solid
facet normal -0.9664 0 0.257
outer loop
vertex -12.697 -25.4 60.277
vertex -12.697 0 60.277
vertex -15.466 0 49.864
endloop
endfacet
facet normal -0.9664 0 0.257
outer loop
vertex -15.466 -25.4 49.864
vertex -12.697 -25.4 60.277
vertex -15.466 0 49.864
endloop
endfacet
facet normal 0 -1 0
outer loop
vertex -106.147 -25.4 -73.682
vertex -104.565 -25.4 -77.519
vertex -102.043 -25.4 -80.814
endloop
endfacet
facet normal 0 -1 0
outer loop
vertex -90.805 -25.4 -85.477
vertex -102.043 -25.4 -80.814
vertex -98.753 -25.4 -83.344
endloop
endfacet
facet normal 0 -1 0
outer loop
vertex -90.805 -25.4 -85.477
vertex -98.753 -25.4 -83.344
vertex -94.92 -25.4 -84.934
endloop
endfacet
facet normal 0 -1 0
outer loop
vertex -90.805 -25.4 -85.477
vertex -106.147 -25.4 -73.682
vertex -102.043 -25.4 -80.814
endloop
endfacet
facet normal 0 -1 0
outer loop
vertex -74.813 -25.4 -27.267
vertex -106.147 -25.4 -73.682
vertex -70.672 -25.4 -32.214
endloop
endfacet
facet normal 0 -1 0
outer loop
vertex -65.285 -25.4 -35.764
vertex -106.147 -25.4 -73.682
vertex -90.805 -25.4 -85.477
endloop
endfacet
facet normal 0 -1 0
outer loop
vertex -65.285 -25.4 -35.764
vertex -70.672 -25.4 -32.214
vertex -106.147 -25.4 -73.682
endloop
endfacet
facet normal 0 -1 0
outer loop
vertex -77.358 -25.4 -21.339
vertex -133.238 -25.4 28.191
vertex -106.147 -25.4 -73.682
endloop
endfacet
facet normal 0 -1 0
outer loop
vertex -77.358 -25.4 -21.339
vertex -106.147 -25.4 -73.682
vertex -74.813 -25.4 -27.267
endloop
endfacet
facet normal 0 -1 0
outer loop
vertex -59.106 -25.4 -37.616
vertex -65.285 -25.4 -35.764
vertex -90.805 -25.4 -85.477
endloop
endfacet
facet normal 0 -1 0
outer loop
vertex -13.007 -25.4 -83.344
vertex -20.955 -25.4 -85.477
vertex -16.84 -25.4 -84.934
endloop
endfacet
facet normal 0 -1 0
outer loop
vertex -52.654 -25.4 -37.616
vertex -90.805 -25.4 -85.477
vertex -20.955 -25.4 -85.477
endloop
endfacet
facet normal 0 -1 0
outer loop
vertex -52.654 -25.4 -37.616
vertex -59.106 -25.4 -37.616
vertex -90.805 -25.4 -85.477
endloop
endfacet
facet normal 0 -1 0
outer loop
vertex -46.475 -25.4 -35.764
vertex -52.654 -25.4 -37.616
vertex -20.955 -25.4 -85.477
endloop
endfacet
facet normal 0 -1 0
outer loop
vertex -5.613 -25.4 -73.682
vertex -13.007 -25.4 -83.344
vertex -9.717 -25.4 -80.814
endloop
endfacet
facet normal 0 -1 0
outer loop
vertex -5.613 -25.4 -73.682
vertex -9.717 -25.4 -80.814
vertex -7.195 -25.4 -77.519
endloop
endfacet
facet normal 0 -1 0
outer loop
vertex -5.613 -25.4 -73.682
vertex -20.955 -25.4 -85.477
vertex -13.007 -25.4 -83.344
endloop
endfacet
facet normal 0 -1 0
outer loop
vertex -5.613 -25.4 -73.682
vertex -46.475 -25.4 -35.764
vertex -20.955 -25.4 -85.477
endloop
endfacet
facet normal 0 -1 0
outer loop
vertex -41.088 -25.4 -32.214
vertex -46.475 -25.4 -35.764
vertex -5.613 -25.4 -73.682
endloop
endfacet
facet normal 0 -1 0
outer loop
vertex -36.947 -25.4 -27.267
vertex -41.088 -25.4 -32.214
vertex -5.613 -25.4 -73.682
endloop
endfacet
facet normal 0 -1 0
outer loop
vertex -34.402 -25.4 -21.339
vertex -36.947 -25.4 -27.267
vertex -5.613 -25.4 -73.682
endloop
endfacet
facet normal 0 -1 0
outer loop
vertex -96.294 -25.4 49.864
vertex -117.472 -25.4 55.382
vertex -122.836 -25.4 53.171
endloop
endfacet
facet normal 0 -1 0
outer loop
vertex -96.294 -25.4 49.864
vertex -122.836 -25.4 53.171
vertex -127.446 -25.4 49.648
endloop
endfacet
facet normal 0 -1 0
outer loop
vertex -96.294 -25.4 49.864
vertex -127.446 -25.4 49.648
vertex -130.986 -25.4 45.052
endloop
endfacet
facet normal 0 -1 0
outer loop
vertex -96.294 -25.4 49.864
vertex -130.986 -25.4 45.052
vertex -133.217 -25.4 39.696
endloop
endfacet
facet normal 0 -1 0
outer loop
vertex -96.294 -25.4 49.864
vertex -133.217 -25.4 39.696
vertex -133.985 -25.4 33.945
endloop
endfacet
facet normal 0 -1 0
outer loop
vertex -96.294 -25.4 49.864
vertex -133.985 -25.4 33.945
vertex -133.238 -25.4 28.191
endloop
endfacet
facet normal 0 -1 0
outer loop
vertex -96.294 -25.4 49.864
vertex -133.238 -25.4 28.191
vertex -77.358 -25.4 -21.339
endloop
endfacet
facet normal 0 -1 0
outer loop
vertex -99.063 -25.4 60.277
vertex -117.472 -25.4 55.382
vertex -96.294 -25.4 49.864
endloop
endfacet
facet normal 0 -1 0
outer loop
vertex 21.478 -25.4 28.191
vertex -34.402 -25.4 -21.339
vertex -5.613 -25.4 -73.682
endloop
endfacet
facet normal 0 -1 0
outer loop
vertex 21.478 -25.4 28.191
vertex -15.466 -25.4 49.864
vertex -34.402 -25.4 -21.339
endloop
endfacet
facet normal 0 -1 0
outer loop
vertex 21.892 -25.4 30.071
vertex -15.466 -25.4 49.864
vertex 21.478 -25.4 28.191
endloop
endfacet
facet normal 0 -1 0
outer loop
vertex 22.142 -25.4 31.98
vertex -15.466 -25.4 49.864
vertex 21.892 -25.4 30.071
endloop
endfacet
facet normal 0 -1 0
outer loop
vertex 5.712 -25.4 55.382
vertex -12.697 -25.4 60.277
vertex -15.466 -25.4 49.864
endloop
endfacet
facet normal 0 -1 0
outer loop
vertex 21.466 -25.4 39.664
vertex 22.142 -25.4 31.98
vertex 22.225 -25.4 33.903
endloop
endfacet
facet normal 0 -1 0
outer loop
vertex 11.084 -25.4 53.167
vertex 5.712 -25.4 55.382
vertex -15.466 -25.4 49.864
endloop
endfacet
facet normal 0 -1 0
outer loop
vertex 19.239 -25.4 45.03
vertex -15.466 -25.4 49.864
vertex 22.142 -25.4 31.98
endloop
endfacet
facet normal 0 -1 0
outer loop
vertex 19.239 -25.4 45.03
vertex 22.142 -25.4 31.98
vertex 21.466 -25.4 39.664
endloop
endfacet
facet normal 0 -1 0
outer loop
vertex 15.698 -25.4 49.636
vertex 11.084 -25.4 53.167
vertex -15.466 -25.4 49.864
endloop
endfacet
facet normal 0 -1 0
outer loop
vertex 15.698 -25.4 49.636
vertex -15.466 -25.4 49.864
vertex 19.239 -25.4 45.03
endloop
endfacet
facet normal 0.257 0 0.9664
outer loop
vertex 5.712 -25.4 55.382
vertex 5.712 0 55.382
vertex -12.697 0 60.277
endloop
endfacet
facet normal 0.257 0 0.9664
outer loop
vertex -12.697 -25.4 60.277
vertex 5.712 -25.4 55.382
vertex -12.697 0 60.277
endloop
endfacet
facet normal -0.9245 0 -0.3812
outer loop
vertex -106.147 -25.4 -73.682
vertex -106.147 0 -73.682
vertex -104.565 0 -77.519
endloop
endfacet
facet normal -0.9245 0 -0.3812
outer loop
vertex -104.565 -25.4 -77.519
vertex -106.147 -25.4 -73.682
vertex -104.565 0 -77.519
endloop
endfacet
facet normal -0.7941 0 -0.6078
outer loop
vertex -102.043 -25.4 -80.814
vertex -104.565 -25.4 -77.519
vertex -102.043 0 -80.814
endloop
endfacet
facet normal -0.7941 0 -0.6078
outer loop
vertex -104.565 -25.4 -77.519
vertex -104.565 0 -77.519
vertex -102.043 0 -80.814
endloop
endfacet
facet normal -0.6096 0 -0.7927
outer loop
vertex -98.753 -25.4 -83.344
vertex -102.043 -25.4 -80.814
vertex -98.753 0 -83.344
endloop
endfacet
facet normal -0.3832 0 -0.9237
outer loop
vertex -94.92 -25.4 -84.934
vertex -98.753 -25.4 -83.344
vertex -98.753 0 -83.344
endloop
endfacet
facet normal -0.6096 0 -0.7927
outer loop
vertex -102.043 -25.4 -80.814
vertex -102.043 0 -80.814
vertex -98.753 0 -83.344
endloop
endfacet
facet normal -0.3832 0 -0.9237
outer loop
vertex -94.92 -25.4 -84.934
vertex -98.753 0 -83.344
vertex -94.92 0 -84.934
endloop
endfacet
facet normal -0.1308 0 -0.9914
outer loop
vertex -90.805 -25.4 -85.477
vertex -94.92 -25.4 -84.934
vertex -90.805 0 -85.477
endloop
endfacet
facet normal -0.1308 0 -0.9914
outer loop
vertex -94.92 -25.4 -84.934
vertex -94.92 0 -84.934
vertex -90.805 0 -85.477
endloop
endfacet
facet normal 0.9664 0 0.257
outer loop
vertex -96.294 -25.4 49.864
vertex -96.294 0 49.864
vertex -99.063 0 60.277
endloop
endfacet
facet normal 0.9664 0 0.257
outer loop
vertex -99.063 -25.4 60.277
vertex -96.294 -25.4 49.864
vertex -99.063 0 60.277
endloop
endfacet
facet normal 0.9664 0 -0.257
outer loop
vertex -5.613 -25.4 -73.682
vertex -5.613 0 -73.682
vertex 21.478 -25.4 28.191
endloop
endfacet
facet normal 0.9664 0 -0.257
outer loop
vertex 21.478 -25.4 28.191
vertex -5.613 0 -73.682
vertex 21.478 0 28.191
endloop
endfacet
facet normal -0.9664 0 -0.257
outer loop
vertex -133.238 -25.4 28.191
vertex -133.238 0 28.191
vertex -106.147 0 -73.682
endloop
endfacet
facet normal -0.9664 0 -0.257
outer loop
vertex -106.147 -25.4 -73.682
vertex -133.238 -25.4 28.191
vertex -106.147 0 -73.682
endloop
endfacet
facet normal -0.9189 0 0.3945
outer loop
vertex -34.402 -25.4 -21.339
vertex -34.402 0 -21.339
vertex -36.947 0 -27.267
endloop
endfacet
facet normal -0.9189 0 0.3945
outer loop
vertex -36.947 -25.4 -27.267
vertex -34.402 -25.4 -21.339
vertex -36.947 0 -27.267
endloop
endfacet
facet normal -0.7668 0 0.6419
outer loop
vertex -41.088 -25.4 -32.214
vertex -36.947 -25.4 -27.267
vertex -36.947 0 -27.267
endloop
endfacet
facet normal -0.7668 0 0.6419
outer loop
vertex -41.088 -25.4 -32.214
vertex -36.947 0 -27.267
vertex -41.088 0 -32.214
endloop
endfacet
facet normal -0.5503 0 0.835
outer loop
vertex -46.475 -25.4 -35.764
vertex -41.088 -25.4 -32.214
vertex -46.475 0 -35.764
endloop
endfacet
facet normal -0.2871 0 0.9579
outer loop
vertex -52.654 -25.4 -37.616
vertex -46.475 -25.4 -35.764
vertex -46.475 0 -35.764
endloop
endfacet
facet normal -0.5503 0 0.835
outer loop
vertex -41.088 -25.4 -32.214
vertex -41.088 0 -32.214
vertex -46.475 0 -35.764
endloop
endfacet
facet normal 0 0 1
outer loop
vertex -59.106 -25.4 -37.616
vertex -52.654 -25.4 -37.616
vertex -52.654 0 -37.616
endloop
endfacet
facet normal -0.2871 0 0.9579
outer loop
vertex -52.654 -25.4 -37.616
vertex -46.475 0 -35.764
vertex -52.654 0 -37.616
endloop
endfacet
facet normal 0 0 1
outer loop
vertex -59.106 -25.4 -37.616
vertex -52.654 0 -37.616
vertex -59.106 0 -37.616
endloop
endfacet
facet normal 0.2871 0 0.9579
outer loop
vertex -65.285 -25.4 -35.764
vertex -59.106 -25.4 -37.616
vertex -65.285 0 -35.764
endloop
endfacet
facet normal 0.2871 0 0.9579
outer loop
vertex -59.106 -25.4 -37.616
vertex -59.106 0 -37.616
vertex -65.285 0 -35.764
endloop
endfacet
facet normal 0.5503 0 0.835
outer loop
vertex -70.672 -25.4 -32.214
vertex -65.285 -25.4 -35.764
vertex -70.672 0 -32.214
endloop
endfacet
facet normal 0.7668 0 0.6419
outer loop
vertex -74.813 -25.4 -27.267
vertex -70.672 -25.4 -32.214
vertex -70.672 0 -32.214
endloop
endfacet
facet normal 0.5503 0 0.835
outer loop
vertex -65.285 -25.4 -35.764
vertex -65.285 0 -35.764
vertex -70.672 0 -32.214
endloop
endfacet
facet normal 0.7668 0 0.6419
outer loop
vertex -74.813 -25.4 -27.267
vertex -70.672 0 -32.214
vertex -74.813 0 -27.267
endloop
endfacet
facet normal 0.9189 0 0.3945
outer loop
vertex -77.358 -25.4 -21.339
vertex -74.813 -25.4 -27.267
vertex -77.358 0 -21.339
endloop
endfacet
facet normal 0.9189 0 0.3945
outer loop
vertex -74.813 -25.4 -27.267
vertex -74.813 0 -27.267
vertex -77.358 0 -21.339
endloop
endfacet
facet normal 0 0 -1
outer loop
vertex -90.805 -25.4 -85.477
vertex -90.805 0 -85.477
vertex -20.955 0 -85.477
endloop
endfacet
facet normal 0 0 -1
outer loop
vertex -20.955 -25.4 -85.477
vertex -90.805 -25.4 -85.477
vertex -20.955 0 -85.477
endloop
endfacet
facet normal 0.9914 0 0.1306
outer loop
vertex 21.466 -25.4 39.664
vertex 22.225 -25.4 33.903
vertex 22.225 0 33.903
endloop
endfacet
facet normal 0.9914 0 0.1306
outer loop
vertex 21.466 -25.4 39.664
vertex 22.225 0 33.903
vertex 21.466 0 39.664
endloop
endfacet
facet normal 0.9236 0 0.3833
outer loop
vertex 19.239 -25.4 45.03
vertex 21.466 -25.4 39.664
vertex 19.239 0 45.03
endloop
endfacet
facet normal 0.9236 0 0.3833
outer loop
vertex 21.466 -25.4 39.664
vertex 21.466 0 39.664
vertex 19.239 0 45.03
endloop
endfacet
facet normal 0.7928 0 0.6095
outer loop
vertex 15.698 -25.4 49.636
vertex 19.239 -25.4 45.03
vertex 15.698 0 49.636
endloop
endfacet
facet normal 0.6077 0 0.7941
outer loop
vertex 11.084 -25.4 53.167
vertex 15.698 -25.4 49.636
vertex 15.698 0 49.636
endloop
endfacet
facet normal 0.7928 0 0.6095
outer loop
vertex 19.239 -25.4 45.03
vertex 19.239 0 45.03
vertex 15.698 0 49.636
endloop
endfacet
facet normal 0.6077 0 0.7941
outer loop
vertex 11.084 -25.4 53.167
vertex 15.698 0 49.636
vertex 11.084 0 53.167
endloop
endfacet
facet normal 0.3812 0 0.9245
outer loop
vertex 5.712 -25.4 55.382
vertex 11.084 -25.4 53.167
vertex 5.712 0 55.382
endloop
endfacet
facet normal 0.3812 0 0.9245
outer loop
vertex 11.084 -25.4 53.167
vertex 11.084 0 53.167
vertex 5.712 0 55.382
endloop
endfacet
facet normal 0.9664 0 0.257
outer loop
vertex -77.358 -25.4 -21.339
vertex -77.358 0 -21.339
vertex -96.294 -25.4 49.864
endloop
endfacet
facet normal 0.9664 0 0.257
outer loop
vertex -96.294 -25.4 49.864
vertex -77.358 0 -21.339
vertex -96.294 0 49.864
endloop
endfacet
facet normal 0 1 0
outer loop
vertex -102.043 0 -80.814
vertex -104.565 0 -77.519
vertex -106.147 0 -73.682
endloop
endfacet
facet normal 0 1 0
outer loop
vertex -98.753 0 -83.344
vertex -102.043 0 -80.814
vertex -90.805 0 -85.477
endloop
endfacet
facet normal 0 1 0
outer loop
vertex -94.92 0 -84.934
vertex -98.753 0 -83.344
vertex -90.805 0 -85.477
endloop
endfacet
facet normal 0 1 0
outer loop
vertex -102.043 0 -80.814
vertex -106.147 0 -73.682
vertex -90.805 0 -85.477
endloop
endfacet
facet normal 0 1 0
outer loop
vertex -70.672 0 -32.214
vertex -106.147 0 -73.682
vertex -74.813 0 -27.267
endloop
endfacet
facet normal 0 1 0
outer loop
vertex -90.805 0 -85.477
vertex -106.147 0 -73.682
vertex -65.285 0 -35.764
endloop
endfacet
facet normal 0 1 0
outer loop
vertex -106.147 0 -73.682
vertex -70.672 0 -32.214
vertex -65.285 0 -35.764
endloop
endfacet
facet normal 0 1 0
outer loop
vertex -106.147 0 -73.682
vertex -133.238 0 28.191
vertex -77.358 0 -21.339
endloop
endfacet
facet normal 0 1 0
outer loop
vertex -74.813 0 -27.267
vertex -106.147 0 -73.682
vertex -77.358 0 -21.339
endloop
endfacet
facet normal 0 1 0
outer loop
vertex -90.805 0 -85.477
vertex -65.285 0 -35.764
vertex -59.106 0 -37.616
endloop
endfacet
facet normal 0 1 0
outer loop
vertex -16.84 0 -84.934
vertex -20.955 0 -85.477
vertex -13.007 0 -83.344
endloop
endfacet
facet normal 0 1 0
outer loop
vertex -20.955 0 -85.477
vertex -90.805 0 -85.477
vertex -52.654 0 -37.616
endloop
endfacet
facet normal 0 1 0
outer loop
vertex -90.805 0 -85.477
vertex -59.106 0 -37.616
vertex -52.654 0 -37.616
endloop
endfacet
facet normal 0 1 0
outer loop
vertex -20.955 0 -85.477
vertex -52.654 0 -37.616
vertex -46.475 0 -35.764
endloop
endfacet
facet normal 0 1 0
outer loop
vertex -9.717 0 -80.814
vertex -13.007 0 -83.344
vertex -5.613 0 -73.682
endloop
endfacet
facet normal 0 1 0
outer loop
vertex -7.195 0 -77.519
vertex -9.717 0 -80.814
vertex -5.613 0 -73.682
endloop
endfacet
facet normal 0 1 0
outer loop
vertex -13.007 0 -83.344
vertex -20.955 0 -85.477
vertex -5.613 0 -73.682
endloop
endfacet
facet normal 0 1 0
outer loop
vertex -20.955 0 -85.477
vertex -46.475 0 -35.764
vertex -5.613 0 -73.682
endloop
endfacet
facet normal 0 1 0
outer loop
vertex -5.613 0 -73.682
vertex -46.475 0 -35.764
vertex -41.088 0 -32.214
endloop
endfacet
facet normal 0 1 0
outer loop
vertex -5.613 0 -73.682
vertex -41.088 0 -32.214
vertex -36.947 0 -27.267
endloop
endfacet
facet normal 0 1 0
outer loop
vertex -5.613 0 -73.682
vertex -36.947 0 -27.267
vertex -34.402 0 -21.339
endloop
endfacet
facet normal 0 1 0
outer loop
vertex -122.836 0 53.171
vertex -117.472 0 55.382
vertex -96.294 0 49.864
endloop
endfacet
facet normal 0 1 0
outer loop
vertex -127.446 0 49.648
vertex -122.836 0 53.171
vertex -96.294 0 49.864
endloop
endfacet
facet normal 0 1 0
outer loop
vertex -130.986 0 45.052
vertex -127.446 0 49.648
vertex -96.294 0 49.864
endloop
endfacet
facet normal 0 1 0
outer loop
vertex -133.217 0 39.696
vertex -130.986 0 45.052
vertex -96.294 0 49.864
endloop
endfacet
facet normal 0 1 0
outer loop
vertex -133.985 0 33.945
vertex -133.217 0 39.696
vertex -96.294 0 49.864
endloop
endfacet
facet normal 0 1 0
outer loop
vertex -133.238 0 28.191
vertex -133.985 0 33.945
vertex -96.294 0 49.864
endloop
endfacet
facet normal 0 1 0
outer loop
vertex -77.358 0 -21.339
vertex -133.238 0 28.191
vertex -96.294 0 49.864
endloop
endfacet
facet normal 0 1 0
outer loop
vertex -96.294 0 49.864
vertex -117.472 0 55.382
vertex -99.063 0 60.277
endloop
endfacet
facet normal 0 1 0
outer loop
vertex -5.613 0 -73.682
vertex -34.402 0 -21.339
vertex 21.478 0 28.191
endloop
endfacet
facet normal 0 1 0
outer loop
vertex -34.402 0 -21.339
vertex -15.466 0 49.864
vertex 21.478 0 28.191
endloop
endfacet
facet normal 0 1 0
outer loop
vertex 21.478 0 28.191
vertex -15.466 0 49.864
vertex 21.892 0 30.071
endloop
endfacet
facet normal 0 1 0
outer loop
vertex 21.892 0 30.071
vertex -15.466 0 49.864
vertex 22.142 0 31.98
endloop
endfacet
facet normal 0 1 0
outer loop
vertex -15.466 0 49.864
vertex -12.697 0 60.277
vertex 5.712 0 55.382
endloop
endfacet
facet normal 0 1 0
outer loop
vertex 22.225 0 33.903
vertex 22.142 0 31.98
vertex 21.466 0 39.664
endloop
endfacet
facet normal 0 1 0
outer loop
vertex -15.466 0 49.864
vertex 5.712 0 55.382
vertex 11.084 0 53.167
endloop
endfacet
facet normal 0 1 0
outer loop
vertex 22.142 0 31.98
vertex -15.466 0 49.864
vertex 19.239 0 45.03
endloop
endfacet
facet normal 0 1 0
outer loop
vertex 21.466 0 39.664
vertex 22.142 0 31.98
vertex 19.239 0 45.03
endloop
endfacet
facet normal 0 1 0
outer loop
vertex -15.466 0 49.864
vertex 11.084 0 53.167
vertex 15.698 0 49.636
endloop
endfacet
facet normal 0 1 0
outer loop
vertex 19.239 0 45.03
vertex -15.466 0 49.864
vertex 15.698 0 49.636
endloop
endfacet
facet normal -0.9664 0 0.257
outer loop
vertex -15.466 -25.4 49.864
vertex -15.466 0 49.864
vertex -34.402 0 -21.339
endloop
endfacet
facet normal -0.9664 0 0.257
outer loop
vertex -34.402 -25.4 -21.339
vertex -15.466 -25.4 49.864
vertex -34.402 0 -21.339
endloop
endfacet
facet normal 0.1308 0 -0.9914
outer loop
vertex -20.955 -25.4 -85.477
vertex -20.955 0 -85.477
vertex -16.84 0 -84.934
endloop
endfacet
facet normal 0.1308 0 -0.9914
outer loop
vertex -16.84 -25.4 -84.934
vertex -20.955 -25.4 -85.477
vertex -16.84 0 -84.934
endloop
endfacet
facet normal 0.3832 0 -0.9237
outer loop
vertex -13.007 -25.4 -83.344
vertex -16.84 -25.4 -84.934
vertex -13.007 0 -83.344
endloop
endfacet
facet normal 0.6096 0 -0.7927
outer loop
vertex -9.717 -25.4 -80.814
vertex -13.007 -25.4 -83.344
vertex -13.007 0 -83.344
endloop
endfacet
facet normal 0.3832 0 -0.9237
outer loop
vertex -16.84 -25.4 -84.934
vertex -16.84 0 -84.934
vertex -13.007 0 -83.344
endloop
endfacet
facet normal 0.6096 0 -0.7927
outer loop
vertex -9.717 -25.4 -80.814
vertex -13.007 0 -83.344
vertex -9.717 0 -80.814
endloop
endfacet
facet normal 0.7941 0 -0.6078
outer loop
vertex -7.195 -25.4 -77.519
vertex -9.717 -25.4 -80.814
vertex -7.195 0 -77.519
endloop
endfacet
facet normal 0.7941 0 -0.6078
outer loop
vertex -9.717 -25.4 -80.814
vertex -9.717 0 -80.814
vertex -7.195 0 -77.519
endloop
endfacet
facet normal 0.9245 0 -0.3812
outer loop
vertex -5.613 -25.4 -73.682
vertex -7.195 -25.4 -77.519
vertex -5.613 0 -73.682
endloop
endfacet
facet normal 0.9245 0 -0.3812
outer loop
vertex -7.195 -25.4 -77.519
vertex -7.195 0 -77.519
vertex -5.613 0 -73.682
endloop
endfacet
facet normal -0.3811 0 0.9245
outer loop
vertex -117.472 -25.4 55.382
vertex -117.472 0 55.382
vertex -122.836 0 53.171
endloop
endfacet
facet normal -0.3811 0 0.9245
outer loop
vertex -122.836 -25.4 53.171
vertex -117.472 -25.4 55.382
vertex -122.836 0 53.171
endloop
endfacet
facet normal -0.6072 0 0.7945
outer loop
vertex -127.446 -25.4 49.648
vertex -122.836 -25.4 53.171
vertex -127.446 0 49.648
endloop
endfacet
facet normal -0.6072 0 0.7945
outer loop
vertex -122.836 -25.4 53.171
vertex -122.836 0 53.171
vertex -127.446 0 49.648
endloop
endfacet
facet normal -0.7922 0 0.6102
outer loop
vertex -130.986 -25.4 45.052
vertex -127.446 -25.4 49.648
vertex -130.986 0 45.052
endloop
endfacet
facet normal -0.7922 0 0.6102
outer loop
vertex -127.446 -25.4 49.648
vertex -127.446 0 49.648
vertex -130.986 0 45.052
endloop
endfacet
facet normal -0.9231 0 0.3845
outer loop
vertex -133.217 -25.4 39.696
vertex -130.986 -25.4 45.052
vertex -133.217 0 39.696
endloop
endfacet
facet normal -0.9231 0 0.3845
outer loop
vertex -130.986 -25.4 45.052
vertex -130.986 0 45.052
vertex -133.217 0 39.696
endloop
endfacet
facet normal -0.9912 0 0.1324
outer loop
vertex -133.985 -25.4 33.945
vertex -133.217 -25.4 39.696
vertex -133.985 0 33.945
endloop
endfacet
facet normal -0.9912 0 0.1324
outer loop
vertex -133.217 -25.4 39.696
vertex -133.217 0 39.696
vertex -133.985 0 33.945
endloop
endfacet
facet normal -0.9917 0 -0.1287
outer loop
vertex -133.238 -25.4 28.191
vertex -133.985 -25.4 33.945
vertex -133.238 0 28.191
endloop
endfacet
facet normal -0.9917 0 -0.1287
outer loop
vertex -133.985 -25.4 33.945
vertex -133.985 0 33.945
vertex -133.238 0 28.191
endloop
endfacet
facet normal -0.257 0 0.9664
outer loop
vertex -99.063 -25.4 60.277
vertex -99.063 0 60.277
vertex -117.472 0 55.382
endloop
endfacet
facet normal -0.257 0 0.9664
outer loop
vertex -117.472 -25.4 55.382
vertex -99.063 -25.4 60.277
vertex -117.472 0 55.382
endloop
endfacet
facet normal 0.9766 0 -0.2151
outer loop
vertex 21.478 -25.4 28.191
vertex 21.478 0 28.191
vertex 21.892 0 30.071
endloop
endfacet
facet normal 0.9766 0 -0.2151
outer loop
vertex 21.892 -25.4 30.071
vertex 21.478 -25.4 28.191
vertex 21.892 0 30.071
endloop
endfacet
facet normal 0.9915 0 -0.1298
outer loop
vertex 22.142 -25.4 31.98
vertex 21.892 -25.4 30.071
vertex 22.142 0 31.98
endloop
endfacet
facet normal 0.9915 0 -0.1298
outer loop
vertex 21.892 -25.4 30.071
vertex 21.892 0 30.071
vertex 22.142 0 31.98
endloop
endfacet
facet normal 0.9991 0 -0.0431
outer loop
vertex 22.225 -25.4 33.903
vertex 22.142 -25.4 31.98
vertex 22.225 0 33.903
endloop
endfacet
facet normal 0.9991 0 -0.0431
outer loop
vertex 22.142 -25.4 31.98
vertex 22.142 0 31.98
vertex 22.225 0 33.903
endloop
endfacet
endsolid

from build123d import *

# Parameters (mm, degrees)
F1_DEPTH = 25.4


with BuildPart() as f1:
    # F0 (on Front) → F1 (new body)
    with BuildSketch(Plane.XZ):
        with BuildLine():
            ThreePointArc((-96.2938510095, 49.8640834202), (-106.1566639379, 55.4102805892), (-117.4718999148, 55.3817029315))
            ThreePointArc((-117.4718999148, 55.3817029315), (-130.9864974324, 45.0518805264), (-133.238473511, 28.1913295056))
            ThreePointArc((-133.238473511, 28.1913295056), (-111.9975569081, 11.6794990469), (-90.4085331471, 27.7335059074))
            Line((-90.4085331471, 27.7335059074), (-96.2938510095, 49.8640834202))
        make_face()
        with BuildLine():
            Line((-99.0630919931, 60.2772681748), (-117.4718999148, 55.3817029315))
            ThreePointArc((-117.4718999148, 55.3817029315), (-106.1566639379, 55.4102805892), (-96.2938510095, 49.8640834202))
            Line((-96.2938510095, 49.8640834202), (-99.0630919931, 60.2772681748))
        make_face()
        with BuildLine():
            ThreePointArc((-90.4085331471, 27.7335059074), (-111.9975569081, 11.6794990469), (-133.238473511, 28.1913295056))
            Line((-133.238473511, 28.1913295056), (-106.1467650121, -73.6816990901))
            ThreePointArc((-106.1467650121, -73.6816990901), (-92.8623116551, -53.860643351), (-74.9299982186, -69.6017705795))
            ThreePointArc((-74.9299982186, -69.6017705795), (-79.5796780672, -80.8270907309), (-90.8049982186, -85.4767705795))
            Line((-90.8049982186, -85.4767705795), (-20.9549982186, -85.4767705795))
            ThreePointArc((-20.9549982186, -85.4767705795), (-32.1803231924, -58.3764516879), (-5.0800017814, -69.6017705795))
            ThreePointArc((-5.0800017814, -69.6017705795), (-5.2138745529, -71.659084016), (-5.6132349879, -73.6816990901))
            Line((-5.6132349879, -73.6816990901), (21.478473511, 28.1913295056))
            ThreePointArc((21.478473511, 28.1913295056), (0.2375569081, 11.6794990469), (-21.3514668529, 27.7335059074))
            Line((-21.3514668529, 27.7335059074), (-34.401526489, -21.3386704944))
            ThreePointArc((-34.401526489, -21.3386704944), (-55.88, -37.8517705795), (-77.358473511, -21.3386704944))
            Line((-77.358473511, -21.3386704944), (-90.4085331471, 27.7335059074))
        make_face()
        with BuildLine():
            ThreePointArc((-74.9299982186, -69.6017705795), (-92.8623116551, -53.860643351), (-106.1467650121, -73.6816990901))
            ThreePointArc((-106.1467650121, -73.6816990901), (-100.4809157434, -82.1871686683), (-90.8049982186, -85.4767705795))
            ThreePointArc((-90.8049982186, -85.4767705795), (-79.5796780672, -80.8270907309), (-74.9299982186, -69.6017705795))
        make_face()
        with BuildLine():
            ThreePointArc((-5.0800017814, -69.6017705795), (-32.1803231924, -58.3764516879), (-20.9549982186, -85.4767705795))
            ThreePointArc((-20.9549982186, -85.4767705795), (-11.2790828443, -82.1871675825), (-5.6132349879, -73.6816990901))
            ThreePointArc((-5.6132349879, -73.6816990901), (-5.2138745529, -71.659084016), (-5.0800017814, -69.6017705795))
        make_face()
        with BuildLine():
            Line((-15.4661489905, 49.8640834202), (-21.3514668529, 27.7335059074))
            ThreePointArc((-21.3514668529, 27.7335059074), (0.2375569081, 11.6794990469), (21.478473511, 28.1913295056))
            ThreePointArc((21.478473511, 28.1913295056), (22.0375781199, 31.0229906094), (22.225, 33.9032294205))
            ThreePointArc((22.225, 33.9032294205), (17.6195573243, 47.4495139552), (5.7118999148, 55.3817029315))
            ThreePointArc((5.7118999148, 55.3817029315), (-5.6033360621, 55.4102805892), (-15.4661489905, 49.8640834202))
        make_face()
        with BuildLine():
            Line((-12.6969080069, 60.2772681748), (-15.4661489905, 49.8640834202))
            ThreePointArc((-15.4661489905, 49.8640834202), (-5.6033360621, 55.4102805892), (5.7118999148, 55.3817029315))
            Line((5.7118999148, 55.3817029315), (-12.6969080069, 60.2772681748))
        make_face()
    extrude(amount=F1_DEPTH)


solid = f1.part
